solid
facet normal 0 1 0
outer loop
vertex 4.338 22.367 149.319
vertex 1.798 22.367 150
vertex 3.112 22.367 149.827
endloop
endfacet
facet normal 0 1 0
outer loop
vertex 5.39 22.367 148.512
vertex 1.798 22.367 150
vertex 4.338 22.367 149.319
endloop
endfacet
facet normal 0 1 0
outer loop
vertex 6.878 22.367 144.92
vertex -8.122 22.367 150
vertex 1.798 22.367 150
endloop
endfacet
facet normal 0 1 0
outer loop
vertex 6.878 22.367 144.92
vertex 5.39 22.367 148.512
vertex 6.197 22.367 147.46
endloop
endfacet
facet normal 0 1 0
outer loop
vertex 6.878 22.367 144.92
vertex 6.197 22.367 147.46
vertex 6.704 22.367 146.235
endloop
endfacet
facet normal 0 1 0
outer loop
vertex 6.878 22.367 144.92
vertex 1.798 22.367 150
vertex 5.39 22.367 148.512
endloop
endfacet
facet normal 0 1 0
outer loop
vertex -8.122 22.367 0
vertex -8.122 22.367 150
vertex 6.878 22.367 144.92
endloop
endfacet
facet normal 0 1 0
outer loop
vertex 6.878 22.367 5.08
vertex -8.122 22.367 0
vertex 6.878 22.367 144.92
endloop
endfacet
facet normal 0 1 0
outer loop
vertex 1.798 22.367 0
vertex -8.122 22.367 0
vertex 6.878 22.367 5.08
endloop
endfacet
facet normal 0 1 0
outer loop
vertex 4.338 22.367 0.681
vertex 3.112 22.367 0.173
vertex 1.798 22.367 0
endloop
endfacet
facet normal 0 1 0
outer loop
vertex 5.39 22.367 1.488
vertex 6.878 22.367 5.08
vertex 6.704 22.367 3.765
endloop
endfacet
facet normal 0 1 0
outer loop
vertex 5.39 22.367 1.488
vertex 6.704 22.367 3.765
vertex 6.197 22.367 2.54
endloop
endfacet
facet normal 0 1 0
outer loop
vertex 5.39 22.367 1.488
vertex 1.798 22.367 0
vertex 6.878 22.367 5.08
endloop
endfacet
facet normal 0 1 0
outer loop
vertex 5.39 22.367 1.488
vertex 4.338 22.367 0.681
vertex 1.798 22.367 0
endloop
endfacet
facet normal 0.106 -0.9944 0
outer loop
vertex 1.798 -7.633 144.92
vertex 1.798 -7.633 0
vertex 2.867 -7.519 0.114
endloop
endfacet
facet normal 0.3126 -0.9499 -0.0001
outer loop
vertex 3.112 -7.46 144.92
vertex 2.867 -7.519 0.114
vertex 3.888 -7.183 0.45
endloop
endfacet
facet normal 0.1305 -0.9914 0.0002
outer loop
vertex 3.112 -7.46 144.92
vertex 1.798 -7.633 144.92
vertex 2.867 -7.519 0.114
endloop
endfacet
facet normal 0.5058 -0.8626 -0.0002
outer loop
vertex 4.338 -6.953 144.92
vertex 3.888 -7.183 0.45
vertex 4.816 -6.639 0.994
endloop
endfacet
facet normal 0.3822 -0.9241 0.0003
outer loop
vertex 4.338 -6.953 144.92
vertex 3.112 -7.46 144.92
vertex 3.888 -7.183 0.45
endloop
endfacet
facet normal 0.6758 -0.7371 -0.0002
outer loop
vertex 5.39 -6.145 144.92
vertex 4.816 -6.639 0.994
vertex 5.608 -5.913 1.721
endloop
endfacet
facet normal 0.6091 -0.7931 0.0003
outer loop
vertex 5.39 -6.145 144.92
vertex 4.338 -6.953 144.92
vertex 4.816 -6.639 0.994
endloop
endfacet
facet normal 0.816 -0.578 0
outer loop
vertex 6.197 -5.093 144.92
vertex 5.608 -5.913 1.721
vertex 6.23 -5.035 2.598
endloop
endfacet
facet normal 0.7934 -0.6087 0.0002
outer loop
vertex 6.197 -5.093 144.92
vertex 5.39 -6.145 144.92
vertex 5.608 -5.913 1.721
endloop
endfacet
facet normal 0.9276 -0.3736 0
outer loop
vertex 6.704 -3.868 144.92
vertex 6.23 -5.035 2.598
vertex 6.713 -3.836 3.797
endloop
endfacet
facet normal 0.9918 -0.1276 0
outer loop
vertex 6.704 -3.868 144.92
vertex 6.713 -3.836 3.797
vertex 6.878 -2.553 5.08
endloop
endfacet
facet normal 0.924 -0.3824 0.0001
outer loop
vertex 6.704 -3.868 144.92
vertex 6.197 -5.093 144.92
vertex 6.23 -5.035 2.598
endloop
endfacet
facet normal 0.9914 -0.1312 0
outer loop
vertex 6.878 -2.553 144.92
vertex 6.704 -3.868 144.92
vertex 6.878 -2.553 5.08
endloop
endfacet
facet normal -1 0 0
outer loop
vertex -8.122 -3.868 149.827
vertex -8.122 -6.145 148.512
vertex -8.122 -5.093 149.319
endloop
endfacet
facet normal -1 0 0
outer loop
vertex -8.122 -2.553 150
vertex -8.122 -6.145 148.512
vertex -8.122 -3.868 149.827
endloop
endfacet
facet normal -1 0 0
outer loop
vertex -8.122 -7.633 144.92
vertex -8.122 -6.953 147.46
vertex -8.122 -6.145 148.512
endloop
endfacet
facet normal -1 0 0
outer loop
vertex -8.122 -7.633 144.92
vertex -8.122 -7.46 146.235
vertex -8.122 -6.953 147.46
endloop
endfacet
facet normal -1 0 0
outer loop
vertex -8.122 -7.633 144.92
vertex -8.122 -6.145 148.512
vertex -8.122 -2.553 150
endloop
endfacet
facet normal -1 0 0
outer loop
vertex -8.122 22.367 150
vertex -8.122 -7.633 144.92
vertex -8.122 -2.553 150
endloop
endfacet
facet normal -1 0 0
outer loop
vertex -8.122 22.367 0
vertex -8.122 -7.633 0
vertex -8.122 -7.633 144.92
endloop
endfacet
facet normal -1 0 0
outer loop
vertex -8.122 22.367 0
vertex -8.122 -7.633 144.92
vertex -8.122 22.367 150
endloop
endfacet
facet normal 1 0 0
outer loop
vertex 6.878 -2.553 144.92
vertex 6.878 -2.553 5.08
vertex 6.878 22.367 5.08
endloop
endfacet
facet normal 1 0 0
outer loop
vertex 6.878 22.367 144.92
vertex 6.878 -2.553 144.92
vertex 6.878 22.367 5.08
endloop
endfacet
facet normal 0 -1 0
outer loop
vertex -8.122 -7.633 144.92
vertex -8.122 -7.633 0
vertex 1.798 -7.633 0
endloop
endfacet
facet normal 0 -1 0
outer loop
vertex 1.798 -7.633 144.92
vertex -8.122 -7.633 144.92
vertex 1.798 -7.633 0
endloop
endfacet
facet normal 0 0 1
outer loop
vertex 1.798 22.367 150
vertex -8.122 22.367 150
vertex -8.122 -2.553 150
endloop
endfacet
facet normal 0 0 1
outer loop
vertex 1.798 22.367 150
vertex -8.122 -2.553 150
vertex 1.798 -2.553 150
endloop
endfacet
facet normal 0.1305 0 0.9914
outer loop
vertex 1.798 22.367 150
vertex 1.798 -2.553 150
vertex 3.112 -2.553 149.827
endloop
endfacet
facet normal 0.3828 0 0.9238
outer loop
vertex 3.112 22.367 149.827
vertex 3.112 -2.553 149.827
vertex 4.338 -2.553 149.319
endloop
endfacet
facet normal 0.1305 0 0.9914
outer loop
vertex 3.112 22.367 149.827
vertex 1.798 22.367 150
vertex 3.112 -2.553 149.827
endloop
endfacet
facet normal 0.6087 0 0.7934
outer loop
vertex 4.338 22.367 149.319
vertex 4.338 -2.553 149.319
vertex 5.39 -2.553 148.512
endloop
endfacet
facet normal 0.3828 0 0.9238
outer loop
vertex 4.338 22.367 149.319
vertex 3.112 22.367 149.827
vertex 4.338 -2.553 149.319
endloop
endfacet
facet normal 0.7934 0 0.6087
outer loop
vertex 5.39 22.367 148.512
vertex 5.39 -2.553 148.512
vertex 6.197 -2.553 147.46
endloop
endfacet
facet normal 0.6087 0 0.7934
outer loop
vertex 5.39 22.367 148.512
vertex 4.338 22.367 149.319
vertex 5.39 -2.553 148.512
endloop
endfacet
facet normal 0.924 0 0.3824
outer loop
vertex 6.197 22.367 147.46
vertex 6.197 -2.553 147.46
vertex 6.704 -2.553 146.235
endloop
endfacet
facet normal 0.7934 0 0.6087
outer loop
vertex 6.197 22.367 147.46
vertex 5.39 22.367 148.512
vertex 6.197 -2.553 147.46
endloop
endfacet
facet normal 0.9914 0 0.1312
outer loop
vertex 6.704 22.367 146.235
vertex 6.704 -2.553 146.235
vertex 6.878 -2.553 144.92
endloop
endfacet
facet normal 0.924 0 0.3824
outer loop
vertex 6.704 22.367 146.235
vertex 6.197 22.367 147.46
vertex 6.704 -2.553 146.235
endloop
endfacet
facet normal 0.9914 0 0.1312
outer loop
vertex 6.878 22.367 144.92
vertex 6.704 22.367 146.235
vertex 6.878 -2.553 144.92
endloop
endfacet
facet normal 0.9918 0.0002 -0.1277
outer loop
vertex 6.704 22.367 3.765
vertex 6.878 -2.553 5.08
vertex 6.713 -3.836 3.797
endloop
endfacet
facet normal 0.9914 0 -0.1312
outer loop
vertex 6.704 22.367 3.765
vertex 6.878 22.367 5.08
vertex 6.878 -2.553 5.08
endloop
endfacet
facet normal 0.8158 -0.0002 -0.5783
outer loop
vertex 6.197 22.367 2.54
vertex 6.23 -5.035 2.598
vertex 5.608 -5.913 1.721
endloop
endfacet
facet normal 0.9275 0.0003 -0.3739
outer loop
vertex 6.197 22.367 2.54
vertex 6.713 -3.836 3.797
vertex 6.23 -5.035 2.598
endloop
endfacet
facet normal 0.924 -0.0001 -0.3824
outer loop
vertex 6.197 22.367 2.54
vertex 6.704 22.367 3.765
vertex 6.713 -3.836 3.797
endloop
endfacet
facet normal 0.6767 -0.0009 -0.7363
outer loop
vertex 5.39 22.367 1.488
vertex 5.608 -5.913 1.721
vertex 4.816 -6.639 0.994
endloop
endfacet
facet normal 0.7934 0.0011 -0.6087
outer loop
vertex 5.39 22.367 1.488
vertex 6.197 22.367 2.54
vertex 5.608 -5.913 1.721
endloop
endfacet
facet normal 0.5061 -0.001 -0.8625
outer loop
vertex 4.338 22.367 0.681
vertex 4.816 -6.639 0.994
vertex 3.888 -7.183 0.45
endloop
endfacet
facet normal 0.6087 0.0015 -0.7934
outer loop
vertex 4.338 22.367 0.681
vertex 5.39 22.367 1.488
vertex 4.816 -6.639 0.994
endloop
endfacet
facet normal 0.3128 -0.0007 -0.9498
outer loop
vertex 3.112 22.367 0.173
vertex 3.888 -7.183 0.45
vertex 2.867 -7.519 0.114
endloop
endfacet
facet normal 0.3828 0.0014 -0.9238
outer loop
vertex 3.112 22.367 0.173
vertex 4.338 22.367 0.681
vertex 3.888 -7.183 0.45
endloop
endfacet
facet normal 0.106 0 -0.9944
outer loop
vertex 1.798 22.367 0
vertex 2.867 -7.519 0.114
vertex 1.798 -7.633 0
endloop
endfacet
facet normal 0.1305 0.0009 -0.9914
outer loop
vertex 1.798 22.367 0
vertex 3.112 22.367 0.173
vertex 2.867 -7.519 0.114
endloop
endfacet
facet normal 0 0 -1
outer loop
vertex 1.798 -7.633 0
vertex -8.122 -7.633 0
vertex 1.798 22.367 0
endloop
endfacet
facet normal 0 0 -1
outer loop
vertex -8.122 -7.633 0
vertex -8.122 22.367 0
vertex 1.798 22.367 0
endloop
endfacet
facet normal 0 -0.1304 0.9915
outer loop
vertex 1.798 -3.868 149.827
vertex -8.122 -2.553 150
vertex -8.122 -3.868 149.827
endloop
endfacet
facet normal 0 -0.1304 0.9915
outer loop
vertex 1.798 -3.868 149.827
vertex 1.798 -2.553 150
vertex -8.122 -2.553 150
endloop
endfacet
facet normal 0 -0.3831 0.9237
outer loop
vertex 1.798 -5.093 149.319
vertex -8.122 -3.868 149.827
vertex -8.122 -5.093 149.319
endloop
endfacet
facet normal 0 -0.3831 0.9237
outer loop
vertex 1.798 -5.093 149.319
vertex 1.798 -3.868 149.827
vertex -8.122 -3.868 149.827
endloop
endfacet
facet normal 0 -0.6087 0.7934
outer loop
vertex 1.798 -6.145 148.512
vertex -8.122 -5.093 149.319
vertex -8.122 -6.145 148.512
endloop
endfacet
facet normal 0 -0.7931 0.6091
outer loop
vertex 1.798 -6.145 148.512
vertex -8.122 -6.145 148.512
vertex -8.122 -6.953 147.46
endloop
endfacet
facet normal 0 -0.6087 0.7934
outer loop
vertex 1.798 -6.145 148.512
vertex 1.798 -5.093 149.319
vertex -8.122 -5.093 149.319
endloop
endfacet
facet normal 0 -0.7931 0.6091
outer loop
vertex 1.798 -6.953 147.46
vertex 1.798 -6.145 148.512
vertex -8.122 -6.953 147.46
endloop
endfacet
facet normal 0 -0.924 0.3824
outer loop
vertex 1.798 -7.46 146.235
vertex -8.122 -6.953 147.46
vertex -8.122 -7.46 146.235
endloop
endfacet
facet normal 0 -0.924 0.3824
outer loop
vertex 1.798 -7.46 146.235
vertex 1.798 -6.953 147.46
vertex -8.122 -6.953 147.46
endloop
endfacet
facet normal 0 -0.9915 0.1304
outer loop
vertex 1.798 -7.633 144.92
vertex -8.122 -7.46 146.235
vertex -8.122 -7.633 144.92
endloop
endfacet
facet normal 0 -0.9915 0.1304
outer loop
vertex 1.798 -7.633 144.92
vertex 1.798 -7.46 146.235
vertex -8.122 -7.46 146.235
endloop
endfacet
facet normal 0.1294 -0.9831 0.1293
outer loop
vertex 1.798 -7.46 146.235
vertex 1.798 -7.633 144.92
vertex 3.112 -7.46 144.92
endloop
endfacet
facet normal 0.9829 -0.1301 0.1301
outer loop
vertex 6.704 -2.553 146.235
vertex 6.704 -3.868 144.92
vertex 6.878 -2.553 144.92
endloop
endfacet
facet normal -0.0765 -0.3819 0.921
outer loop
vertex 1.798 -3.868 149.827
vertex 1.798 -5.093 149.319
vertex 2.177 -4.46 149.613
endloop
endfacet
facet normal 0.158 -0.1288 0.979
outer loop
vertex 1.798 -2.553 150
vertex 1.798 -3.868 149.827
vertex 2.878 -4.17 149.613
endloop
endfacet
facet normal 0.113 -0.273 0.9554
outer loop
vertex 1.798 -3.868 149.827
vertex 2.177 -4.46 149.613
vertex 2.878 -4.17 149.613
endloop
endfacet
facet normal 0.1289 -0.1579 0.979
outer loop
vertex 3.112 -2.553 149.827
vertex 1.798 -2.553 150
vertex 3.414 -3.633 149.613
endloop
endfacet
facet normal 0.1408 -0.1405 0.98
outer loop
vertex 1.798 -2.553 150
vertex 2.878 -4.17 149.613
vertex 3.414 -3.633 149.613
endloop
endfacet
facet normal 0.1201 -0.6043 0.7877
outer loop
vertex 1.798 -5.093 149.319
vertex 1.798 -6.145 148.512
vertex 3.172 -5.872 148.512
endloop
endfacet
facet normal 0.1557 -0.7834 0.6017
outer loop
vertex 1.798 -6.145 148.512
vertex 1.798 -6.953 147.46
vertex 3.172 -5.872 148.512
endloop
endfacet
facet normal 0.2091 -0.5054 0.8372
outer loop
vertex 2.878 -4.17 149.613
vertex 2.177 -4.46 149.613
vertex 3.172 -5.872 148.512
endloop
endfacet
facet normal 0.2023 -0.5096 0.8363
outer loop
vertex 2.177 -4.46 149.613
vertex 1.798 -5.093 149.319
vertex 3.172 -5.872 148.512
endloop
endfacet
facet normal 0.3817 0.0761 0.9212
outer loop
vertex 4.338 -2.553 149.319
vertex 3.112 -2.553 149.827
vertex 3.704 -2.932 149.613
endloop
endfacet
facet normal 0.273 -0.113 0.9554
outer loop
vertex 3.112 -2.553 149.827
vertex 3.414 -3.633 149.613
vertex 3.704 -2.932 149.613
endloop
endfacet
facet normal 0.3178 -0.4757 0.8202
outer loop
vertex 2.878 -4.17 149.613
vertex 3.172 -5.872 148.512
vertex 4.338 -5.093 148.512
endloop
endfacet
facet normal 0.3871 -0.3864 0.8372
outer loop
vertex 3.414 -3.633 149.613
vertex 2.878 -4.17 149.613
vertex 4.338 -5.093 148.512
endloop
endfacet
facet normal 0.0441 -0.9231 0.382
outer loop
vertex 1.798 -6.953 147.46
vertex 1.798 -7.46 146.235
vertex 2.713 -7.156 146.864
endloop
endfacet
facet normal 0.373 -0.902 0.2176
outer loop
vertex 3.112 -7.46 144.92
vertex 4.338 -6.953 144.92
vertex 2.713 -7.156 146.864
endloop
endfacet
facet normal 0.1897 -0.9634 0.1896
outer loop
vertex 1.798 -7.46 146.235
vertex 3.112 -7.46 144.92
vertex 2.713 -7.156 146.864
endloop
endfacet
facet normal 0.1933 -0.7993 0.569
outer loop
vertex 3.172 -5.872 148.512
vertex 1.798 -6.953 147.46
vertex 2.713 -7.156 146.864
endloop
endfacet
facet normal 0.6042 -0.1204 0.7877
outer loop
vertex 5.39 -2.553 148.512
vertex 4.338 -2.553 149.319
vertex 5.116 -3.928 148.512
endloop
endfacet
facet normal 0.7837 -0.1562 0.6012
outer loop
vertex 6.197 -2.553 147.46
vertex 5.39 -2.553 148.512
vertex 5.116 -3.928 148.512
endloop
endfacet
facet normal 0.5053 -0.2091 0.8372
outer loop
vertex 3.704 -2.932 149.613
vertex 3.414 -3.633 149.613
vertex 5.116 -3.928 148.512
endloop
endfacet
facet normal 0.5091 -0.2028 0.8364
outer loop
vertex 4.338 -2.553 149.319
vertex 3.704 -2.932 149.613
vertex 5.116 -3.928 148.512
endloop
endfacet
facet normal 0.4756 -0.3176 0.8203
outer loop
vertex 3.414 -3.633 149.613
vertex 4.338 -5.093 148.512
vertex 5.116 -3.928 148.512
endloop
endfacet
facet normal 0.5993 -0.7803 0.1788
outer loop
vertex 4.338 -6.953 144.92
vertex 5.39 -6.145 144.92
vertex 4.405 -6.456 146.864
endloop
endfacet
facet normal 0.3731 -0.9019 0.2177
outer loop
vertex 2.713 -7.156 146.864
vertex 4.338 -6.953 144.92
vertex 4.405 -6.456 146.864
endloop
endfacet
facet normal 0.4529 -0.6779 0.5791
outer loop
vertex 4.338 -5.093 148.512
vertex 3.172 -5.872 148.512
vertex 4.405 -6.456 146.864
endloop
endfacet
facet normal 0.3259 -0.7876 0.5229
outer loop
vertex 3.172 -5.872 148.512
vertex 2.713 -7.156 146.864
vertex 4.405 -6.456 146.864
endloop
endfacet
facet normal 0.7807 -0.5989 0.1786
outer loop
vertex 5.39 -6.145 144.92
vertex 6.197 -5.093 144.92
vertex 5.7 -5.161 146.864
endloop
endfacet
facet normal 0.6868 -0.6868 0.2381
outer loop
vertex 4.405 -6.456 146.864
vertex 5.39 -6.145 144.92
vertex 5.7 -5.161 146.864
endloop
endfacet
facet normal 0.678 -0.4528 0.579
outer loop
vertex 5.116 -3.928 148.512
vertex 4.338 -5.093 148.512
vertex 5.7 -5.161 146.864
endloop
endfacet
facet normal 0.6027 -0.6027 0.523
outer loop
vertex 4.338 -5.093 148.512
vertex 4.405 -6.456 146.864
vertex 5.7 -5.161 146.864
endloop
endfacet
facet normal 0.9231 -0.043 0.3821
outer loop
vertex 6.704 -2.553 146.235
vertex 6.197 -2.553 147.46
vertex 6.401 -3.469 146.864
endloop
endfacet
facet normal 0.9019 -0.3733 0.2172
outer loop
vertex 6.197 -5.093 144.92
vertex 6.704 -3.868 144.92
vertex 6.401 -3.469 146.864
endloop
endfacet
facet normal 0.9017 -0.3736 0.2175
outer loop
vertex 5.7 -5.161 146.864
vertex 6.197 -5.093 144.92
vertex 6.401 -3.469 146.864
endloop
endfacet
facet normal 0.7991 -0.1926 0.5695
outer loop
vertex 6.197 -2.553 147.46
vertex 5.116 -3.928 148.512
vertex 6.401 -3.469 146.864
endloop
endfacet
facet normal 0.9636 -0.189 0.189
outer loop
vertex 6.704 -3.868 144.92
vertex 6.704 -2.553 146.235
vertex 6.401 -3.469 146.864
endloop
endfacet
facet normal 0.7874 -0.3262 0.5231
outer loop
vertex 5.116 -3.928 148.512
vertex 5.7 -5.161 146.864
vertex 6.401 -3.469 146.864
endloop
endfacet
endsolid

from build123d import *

# Parameters (mm, degrees)
F0_W     = 15
F0_H     = 30
F1_DEPTH = 150
F2_R     = 5.08
F3_R     = 5.08


with BuildPart() as f1:
    # F0 (on Top) → F1 (new body)
    with BuildSketch(Plane.XY):
        with Locations((-0.622407, 7.366808)):
            Rectangle(F0_W, F0_H)
    extrude(amount=F1_DEPTH)

    # F2
    f2_edges = [f1.edges().sort_by_distance(p)[0] for p in [
        (6.877593, -7.633192, 75),
        (6.877593, 7.366808, 0),
    ]]
    fillet(f2_edges, radius=F2_R)

    # F3
    f3_edges = [f1.edges().sort_by_distance(p)[0] for p in [
        (6.877593, 9.906808, 150),
    ]]
    fillet(f3_edges, radius=F3_R)


solid = f1.part
